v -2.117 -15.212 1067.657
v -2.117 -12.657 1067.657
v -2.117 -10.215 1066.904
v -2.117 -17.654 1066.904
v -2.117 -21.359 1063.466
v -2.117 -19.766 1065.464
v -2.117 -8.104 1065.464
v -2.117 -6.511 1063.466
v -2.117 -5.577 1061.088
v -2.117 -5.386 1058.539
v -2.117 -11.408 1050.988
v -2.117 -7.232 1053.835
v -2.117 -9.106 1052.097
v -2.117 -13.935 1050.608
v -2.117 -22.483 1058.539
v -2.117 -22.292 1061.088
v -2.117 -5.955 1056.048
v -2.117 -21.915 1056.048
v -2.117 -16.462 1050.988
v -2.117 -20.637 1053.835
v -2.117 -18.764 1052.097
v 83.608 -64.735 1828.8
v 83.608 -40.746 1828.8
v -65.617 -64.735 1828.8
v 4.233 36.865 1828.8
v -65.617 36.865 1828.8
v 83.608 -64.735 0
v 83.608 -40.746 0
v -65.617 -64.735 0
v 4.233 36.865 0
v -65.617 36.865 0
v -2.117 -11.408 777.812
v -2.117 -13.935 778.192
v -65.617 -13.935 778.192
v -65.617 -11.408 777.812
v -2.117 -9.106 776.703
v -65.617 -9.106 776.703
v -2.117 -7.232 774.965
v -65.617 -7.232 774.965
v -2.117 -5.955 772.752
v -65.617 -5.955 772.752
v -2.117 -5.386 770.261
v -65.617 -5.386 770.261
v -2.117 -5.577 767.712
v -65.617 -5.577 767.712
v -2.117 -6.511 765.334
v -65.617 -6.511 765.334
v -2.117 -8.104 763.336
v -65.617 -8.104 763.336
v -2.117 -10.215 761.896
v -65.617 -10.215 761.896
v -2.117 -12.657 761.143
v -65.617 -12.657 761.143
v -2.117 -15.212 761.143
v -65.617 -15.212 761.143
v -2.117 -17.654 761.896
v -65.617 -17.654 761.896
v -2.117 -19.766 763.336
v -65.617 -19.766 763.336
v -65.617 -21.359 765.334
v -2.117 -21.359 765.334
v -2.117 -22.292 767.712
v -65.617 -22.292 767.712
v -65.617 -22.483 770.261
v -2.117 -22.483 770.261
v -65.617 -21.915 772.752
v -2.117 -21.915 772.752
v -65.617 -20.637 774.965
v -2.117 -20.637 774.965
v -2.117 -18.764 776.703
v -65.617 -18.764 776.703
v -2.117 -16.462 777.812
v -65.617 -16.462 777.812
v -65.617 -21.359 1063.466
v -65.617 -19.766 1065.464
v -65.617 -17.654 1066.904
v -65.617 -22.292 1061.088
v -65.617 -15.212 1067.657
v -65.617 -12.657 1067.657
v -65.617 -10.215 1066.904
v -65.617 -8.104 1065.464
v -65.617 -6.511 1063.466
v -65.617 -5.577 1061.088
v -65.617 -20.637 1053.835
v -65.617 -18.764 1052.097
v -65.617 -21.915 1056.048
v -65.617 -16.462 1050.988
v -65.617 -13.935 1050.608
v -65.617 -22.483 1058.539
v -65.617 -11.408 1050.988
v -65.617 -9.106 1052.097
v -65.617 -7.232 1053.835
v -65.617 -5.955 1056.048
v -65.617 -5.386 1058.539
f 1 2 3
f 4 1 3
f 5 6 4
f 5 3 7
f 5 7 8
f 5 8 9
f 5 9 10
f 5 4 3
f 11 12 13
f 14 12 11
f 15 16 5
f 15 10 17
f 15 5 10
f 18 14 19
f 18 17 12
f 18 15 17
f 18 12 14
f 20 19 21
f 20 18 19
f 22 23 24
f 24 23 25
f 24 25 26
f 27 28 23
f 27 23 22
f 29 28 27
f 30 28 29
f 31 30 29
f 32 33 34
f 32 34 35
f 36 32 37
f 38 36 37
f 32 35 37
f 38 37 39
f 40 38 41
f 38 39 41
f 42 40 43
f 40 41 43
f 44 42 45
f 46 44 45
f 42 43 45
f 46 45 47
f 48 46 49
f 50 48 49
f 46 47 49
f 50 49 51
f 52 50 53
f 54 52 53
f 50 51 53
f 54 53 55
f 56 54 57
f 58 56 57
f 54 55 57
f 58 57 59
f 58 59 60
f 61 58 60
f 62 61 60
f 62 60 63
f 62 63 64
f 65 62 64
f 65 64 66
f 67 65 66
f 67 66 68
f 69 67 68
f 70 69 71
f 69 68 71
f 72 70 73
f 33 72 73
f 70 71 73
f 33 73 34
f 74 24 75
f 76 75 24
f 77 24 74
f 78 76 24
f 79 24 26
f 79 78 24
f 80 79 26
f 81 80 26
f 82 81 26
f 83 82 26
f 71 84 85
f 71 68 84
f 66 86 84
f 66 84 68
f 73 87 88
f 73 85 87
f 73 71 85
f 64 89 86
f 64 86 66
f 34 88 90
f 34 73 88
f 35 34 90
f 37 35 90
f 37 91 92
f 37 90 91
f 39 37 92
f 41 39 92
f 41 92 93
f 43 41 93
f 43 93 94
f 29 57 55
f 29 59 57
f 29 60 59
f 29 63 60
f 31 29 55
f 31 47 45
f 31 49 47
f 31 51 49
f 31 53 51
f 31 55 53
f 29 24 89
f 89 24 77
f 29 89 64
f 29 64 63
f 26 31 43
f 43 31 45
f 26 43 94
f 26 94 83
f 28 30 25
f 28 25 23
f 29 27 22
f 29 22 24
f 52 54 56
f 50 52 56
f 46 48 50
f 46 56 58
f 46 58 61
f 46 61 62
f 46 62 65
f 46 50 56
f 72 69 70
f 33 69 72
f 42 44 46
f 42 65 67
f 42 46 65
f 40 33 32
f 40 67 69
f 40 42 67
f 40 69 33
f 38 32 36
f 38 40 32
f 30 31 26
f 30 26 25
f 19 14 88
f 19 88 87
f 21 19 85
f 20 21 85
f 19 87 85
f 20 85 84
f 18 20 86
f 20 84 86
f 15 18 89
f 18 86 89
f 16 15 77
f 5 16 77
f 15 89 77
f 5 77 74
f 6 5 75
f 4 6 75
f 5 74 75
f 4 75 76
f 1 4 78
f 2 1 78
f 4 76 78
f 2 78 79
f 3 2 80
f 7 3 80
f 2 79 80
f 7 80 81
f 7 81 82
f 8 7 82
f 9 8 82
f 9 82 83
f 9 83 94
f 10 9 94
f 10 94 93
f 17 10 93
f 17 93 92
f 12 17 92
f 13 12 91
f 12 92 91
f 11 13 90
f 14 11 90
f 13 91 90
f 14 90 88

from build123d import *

# Parameters (mm, degrees)
BOSS_EXTRUDE1_DEPTH = 1828.8
SKETCH3_R           = 8.5725
CUT_EXTRUDE2_DEPTH  = 63.5


with BuildPart() as part:
    # Sketch1 → Boss-Extrude1 (new body)
    with BuildSketch(Plane.XY):
        Polygon((4.233333333, 36.865277778), (83.608333333, -40.745833333), (83.608333333, -64.734722222), (-65.616666667, -64.734722222), (-65.616666667, 36.865277778), align=None)
    extrude(amount=BOSS_EXTRUDE1_DEPTH)

    # Sketch3 → Cut-Extrude2 (cut)
    with BuildSketch(Plane.ZY.offset(65.616666667)):
        with Locations((769.62, -13.934722222)):
            Circle(SKETCH3_R)
        with Locations(Location((1059.18, -13.934722222, 0), (0, 0, 180))):
            Circle(SKETCH3_R)
    extrude(amount=-CUT_EXTRUDE2_DEPTH, mode=Mode.SUBTRACT)


solid = part.part
